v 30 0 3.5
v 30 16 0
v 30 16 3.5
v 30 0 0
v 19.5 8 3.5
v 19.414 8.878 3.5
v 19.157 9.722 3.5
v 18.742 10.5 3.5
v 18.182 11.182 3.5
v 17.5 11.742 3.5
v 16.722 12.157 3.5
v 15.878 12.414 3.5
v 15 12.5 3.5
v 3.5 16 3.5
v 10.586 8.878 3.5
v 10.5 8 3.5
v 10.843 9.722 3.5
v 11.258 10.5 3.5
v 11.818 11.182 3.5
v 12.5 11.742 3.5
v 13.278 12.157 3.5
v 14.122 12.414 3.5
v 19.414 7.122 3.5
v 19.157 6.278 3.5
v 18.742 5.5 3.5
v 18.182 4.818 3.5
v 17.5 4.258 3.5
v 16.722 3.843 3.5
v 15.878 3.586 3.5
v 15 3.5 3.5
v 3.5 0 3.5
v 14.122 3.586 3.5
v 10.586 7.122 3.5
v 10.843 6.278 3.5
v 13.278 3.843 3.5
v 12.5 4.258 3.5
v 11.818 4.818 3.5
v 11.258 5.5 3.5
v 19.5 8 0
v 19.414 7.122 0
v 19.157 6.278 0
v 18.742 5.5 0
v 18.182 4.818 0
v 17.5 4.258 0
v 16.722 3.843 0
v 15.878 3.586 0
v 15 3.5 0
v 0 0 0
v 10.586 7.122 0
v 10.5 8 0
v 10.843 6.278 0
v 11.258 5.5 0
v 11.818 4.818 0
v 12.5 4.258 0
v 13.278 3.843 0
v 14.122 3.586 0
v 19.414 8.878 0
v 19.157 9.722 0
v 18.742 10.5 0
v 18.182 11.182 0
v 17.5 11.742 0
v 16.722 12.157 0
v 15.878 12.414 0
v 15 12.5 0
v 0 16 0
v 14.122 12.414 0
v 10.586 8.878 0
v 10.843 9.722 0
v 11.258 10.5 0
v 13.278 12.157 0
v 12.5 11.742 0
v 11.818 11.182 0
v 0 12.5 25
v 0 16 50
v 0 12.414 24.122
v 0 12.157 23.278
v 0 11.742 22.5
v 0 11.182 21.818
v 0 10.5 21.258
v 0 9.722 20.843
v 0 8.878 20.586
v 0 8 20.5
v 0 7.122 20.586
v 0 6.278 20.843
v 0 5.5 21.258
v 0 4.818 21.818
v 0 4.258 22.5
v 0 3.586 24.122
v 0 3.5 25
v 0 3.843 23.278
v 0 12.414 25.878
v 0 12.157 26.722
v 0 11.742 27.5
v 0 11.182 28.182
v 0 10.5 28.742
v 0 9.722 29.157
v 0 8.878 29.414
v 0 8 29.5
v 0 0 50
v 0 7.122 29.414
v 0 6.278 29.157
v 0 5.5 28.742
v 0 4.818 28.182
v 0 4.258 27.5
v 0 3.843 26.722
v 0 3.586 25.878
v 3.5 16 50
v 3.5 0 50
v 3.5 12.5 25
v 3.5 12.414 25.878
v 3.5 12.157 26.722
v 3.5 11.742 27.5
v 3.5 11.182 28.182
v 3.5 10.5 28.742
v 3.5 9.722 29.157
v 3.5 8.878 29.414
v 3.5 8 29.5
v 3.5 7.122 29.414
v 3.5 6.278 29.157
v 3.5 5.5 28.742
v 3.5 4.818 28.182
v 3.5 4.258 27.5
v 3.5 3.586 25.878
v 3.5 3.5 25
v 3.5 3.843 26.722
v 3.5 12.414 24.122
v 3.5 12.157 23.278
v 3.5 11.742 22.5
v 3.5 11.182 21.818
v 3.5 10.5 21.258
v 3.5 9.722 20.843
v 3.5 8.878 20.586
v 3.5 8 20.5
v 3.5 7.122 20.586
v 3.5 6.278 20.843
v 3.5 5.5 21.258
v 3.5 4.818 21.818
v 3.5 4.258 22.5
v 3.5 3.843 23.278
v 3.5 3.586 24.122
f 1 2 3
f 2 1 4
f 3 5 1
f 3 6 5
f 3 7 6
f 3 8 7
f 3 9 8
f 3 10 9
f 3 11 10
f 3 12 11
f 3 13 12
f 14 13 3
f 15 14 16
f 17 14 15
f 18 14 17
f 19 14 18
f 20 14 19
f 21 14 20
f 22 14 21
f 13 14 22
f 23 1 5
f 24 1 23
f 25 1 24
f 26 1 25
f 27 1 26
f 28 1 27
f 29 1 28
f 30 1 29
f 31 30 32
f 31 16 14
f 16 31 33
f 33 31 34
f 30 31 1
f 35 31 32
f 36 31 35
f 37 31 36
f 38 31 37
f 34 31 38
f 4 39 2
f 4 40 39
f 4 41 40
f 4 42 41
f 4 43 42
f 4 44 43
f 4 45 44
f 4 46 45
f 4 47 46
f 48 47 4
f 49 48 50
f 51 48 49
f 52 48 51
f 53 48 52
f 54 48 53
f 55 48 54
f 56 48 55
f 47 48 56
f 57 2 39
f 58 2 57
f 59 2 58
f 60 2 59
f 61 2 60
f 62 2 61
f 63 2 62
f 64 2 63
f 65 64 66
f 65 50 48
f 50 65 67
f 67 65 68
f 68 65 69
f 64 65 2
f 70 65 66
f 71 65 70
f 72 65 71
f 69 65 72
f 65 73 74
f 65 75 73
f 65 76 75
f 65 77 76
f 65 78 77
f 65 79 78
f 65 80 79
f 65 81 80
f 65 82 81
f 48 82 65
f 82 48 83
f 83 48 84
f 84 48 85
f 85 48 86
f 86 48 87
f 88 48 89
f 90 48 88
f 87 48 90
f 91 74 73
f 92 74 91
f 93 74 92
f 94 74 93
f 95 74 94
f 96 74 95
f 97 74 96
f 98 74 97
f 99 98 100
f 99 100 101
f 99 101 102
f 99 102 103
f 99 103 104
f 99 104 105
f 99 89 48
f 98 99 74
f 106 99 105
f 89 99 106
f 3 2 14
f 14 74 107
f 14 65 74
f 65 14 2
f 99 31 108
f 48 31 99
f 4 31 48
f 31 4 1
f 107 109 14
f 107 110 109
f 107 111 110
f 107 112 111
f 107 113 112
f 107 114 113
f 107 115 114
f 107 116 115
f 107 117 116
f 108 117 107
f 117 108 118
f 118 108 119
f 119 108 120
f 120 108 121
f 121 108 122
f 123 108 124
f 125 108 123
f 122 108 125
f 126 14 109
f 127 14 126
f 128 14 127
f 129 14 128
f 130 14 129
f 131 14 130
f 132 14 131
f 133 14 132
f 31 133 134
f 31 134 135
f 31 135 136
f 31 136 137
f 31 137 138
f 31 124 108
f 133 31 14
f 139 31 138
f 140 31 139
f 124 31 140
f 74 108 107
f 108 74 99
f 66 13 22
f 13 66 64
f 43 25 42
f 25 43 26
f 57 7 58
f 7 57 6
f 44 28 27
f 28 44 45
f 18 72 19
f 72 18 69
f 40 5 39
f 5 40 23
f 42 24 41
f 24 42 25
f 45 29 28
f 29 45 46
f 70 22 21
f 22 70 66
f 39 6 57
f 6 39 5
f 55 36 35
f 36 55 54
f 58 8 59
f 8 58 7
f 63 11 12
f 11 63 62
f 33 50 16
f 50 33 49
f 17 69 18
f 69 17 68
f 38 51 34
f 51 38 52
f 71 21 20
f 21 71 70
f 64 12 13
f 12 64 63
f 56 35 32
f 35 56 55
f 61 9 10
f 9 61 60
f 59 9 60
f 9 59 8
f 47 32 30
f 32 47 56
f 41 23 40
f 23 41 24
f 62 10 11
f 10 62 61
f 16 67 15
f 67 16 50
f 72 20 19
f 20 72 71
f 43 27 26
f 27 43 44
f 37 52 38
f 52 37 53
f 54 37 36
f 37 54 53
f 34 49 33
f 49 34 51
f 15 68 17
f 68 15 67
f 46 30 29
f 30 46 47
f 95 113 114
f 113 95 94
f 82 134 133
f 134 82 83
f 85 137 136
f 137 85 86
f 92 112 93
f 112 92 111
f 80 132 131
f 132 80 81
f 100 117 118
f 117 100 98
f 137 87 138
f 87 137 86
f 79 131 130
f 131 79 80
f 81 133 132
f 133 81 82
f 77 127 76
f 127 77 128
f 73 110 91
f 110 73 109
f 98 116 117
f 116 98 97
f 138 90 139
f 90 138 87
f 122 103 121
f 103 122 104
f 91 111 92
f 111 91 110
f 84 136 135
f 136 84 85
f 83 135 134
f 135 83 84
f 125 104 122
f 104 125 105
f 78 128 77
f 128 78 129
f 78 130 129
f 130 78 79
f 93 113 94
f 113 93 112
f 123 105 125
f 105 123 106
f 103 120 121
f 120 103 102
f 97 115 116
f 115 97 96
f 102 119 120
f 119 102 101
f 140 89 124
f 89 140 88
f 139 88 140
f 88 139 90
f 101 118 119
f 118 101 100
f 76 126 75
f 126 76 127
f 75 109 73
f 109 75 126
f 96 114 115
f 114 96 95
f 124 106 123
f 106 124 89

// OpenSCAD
$fn = 32;

// ----------------------------------------------------------------------
// L-bracket: 30 x 16 x 50 mm
// ----------------------------------------------------------------------

// --- parameters (mm) ---
arm_x = 30;               // horizontal leg, X
arm_z = 50;               // vertical leg, Z
width = 16;               // bracket depth, Y
wall = 3.5;               // plate thickness
hole_d = 9;               // clearance for M8

module hole_z(px, py) {
  translate([px, py, -2.5]) cylinder(h = wall + 5, d = hole_d);
}
module hole_x(pz, py) {
  translate([-2.5, py, pz]) rotate([0, 90, 0]) cylinder(h = wall + 5, d = hole_d);
}

difference() {
  union() {
    /* horizontal leg */
    cube([arm_x, width, wall]);
    /* vertical leg, overlapping the corner block */
    cube([wall, width, arm_z]);
  }
  hole_z(15, 8);
  hole_x(25, 8);
}
